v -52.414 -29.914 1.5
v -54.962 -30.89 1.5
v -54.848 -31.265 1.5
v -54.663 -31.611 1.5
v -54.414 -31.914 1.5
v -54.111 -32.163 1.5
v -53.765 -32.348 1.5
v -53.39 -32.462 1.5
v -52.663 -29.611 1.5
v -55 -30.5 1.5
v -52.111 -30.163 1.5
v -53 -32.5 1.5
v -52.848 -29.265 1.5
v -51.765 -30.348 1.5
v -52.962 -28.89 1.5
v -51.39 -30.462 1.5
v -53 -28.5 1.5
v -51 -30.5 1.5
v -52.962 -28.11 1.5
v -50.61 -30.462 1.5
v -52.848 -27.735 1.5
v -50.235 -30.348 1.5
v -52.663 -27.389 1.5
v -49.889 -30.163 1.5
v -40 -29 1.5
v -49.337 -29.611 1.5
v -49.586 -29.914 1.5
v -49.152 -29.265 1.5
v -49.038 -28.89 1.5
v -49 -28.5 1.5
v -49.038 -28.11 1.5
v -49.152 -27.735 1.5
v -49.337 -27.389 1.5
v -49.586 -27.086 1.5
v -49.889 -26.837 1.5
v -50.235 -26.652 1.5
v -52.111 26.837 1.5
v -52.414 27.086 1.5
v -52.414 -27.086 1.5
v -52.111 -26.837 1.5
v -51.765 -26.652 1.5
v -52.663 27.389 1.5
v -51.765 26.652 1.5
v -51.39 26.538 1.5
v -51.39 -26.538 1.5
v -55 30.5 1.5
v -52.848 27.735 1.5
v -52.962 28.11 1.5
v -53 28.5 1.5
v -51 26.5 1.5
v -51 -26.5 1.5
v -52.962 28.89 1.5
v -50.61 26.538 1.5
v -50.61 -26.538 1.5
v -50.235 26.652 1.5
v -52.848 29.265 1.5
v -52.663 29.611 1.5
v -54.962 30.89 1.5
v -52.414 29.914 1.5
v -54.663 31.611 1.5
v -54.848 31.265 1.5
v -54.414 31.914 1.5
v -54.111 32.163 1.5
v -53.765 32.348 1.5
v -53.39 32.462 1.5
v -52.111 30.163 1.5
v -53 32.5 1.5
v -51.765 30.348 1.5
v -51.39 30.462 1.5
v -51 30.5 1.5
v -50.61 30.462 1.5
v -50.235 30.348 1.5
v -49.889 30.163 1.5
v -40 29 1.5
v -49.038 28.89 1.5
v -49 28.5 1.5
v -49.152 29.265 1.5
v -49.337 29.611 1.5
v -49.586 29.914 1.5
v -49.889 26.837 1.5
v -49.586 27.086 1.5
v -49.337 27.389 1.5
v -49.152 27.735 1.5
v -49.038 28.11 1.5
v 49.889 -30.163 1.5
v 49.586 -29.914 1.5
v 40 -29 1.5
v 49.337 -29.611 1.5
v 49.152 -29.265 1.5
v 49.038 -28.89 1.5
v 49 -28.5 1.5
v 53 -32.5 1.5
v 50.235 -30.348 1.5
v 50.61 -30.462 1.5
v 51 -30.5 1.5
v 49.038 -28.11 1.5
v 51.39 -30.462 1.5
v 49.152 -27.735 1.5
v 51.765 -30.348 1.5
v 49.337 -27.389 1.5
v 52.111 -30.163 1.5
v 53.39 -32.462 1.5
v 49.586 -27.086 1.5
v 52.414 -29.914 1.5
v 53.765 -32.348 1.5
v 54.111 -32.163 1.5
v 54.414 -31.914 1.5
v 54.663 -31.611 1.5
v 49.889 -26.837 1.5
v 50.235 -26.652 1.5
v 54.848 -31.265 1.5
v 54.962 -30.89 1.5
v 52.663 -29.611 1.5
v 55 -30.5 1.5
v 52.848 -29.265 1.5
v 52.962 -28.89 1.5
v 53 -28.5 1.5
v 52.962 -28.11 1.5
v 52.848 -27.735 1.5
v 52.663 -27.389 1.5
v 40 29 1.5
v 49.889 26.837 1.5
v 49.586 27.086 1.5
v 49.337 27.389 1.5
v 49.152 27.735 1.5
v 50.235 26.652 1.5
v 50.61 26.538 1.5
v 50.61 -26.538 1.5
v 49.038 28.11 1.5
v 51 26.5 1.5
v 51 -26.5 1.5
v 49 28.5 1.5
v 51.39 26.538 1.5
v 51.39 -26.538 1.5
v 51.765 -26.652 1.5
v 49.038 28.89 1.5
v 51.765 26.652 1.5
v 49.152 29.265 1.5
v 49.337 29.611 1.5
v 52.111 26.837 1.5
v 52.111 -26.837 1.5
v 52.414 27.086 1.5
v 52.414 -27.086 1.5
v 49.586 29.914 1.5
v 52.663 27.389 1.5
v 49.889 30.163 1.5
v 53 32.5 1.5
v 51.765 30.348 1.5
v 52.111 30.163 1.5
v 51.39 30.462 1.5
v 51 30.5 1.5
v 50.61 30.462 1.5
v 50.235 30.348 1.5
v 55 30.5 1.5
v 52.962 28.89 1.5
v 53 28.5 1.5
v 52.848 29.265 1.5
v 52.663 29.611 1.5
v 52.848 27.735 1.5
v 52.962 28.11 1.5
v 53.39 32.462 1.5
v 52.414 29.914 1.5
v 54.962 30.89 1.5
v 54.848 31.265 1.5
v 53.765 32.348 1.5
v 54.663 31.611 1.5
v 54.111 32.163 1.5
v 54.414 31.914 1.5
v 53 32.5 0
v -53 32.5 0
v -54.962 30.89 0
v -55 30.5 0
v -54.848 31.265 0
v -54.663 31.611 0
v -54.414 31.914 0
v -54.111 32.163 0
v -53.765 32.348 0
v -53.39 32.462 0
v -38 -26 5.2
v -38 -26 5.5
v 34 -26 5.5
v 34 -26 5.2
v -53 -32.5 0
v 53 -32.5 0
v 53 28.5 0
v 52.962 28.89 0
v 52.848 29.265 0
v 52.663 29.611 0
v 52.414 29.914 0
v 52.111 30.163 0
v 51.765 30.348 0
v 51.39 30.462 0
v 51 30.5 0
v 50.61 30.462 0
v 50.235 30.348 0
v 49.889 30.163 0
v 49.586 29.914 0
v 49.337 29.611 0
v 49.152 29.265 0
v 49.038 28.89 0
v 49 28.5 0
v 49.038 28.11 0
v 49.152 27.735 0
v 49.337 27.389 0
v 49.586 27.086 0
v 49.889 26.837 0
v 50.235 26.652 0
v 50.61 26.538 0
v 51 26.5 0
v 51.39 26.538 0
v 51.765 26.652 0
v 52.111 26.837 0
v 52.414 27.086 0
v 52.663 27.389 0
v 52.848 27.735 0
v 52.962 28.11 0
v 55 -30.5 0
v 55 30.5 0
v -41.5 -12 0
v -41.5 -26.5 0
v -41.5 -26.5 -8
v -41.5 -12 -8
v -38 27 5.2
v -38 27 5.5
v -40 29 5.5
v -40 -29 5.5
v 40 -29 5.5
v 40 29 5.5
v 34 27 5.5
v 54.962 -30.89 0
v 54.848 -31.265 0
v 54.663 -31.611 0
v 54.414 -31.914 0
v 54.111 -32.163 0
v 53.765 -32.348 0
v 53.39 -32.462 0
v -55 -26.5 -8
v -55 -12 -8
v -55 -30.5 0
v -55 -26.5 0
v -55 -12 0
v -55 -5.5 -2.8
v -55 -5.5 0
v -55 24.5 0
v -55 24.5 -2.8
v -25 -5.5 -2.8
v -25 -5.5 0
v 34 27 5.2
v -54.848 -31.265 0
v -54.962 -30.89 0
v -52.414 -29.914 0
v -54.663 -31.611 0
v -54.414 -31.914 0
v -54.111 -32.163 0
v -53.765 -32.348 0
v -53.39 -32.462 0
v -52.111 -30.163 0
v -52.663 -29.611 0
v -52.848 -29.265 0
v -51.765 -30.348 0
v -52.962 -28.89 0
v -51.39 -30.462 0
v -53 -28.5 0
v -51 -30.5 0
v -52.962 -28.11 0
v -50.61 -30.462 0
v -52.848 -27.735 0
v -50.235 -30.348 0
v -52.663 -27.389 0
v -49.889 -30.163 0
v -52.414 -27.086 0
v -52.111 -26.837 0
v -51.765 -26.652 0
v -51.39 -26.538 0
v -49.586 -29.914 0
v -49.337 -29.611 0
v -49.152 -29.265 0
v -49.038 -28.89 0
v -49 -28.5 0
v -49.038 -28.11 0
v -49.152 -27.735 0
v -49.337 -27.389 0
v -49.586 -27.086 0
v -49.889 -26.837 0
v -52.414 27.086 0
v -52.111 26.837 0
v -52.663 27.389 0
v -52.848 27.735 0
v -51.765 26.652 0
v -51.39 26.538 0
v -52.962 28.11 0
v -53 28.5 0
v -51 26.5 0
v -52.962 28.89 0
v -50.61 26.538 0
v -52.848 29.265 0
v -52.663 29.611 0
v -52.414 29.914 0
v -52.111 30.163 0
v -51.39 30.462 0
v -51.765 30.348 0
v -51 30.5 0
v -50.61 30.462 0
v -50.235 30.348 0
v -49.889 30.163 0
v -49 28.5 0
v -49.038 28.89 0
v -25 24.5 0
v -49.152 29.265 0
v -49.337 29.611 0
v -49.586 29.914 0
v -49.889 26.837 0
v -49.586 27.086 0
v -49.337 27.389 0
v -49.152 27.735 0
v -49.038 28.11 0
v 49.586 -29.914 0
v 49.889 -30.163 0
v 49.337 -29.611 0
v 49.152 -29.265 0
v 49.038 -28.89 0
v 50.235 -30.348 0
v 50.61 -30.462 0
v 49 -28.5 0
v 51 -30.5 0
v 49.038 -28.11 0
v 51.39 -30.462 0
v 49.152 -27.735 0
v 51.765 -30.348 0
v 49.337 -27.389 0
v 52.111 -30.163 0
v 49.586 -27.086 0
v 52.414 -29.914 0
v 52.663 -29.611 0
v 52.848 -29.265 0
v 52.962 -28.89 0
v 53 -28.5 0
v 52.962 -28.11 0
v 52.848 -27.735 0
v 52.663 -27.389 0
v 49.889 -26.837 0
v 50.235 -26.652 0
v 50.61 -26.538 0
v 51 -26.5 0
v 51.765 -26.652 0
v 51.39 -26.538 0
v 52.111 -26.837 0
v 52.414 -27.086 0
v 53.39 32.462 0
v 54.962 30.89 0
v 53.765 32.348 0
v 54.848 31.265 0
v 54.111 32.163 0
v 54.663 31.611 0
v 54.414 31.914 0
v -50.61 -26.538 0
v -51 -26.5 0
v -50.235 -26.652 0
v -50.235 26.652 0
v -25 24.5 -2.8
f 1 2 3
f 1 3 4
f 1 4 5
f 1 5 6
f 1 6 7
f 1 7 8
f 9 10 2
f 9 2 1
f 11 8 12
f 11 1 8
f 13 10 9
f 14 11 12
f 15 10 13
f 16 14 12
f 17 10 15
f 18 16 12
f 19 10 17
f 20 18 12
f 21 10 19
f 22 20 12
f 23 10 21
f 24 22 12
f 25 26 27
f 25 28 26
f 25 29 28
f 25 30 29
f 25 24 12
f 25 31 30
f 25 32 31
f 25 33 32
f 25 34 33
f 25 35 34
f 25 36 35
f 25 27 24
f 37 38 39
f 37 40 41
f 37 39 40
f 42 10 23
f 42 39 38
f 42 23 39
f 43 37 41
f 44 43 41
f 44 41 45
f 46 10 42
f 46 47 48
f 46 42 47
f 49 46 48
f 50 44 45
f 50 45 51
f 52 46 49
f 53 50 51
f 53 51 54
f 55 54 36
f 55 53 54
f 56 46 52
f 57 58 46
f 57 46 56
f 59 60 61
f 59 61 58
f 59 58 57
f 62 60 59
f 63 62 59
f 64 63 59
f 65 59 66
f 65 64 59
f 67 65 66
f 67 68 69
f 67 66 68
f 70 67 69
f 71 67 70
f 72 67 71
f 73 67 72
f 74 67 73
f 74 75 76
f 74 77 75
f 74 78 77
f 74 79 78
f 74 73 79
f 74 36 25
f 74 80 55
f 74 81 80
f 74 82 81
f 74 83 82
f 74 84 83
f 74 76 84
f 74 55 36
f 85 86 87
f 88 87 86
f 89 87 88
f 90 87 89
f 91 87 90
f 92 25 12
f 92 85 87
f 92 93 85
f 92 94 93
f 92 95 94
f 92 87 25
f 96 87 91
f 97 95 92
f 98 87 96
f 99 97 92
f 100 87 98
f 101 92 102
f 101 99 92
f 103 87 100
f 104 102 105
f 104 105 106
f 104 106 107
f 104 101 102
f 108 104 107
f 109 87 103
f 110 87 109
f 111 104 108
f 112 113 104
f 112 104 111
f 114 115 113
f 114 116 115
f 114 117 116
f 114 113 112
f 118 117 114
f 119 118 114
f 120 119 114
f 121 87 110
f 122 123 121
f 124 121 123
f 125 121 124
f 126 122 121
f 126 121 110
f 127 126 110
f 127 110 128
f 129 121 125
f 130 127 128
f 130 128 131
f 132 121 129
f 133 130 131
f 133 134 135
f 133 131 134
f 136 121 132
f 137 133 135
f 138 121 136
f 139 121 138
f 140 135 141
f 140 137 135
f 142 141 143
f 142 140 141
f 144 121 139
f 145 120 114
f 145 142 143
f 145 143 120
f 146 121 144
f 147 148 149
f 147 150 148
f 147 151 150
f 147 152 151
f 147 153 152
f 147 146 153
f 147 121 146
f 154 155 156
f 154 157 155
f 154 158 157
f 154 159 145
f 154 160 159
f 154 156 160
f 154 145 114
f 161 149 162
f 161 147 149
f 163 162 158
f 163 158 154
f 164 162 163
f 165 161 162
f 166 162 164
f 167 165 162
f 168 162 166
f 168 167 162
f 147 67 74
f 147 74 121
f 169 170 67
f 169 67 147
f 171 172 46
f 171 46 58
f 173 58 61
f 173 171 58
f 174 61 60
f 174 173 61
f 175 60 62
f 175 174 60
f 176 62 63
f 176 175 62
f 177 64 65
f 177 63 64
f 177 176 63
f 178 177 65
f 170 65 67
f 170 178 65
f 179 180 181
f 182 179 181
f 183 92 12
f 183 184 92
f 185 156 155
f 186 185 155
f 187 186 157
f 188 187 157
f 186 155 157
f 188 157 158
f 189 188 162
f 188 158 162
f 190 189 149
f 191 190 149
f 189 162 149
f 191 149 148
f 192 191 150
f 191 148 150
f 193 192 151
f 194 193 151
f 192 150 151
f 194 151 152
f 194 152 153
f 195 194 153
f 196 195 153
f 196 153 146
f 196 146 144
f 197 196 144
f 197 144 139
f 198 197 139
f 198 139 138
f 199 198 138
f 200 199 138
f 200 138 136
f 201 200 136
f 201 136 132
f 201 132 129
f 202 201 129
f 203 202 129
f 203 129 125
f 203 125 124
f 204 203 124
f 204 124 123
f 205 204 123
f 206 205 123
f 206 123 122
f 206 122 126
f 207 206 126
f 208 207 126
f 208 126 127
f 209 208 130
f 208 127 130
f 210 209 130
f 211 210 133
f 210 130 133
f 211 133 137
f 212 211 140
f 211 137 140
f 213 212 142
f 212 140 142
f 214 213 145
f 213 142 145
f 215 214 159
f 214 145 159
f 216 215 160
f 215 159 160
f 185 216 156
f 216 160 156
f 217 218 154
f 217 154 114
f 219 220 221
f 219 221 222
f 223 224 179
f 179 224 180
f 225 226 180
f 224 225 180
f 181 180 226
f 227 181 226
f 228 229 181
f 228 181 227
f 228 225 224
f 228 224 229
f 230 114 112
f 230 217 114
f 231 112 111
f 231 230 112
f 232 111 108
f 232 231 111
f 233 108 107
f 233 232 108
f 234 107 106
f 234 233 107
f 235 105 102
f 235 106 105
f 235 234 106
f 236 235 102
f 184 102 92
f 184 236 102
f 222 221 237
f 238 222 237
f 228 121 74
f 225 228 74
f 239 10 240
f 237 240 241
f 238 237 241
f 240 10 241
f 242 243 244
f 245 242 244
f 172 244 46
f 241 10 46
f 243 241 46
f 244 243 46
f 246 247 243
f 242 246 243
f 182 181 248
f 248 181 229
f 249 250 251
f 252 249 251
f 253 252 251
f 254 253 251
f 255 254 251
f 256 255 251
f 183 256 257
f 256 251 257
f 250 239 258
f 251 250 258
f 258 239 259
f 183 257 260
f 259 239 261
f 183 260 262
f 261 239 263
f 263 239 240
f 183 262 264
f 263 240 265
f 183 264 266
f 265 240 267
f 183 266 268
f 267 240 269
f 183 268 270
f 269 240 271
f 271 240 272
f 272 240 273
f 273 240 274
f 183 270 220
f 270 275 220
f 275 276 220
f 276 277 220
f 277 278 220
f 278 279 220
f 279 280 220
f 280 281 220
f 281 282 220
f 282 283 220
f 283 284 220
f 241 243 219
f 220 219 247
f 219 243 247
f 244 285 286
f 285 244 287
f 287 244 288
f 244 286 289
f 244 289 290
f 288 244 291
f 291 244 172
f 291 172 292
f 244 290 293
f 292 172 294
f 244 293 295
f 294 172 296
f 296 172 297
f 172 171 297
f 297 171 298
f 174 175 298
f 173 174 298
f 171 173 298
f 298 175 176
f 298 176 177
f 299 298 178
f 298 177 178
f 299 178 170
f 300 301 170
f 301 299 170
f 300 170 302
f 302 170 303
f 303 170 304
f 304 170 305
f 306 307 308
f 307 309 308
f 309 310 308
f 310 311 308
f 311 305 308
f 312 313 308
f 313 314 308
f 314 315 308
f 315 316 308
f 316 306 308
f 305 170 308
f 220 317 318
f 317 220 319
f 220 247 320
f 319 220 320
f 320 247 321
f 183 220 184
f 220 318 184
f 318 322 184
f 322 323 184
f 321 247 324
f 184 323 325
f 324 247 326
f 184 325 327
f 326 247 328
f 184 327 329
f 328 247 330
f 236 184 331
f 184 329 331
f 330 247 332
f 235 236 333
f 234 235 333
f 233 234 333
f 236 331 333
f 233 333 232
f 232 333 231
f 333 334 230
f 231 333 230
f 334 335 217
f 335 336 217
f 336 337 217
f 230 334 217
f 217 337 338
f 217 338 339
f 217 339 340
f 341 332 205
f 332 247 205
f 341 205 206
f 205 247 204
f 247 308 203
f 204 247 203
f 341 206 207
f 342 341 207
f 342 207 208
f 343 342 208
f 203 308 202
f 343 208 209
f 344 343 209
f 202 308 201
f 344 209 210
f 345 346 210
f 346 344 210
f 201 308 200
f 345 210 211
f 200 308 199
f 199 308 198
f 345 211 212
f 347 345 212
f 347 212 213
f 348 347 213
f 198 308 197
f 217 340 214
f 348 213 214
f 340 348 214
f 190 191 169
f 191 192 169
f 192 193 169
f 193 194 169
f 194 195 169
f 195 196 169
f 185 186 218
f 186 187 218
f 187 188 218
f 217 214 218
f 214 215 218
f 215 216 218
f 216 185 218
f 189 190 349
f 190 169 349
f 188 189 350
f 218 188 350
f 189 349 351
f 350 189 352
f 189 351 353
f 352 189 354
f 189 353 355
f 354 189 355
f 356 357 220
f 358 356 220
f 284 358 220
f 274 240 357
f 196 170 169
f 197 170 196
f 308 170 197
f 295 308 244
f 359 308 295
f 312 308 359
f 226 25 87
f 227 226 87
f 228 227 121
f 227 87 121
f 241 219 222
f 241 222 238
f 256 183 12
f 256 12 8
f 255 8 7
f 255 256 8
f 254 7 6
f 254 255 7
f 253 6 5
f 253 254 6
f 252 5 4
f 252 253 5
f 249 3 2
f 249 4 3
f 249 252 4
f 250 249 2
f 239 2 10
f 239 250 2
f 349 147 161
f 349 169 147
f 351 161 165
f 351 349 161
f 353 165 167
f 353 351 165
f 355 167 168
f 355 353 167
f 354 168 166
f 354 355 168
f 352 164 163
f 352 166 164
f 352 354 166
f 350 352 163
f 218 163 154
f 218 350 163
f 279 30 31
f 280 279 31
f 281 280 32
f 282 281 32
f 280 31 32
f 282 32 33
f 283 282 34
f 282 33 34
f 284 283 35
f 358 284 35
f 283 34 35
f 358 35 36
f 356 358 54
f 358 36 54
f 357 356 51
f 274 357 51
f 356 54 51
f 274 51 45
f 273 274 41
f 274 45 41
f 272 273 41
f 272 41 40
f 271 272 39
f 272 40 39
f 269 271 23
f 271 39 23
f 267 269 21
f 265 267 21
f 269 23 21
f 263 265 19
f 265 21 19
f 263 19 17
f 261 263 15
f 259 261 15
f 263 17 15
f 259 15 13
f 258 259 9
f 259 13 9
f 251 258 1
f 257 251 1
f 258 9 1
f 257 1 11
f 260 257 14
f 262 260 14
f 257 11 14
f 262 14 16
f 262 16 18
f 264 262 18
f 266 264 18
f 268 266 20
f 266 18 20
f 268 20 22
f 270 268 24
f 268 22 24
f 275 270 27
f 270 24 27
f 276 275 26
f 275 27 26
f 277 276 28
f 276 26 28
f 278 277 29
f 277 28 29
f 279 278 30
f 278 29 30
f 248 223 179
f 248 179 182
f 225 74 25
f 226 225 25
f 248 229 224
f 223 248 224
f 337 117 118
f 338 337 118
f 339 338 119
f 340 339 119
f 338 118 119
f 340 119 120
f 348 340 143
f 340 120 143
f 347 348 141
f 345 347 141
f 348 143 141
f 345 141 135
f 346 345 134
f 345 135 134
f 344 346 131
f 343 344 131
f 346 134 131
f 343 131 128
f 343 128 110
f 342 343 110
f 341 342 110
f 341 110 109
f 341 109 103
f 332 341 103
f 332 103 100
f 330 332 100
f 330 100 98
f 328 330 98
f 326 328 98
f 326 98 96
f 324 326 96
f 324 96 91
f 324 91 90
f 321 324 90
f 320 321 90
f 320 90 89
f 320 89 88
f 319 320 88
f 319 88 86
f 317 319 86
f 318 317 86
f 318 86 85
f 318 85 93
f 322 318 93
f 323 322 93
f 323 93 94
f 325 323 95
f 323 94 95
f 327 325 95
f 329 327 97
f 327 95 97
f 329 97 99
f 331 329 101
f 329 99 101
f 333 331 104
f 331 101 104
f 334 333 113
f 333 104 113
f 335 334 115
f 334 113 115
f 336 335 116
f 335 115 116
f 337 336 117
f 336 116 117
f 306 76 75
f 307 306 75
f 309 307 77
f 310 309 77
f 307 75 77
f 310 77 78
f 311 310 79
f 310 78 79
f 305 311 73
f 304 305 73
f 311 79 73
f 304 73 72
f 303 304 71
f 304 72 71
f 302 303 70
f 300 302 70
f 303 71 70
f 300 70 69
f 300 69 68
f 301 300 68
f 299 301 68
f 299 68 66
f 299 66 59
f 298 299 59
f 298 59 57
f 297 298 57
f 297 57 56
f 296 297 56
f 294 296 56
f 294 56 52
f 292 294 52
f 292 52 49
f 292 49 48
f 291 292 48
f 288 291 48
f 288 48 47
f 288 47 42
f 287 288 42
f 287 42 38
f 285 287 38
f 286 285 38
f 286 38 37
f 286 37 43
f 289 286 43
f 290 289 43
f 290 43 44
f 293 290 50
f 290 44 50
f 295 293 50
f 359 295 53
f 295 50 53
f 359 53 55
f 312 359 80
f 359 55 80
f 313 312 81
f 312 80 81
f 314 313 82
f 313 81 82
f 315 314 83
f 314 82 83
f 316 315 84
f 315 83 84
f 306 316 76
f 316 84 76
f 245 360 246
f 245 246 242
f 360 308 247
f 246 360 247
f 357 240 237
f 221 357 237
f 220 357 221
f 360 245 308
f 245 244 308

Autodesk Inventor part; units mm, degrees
ref_plane "YZ Plane" through (0, 0, 0) normal (1, 0, 0) x (0, 1, 0)
ref_plane "XZ Plane" through (0, 0, 0) normal (0, 1, 0) x (-1, 0, 0)
ref_plane "XY Plane" through (0, 0, 0) normal (0, 0, 1) x (1, 0, 0)
sketch "Skizze1" plane through (0, 0, 0) normal (0, 0, 1) x (1, 0, 0)
  line L0 (-53, 32.5) -> (53, 32.5)
  line L1 (55, 30.5) -> (55, -30.5)
  line L2 (53, -32.5) -> (-53, -32.5)
  line L3 (-55, -30.5) -> (-55, 30.5)
  line L4 (-55, 32.5) -> (55, -32.5) construction
  line L5 (55, 32.5) -> (-55, -32.5) construction
  arc A0 (-53, 32.5) -> (-55, 30.5) centre (-53, 30.5) ccw
  arc A1 (55, 30.5) -> (53, 32.5) centre (53, 30.5) ccw
  arc A2 (53, -32.5) -> (55, -30.5) centre (53, -30.5) ccw
  arc A3 (-55, -30.5) -> (-53, -32.5) centre (-53, -30.5) ccw
  point P0 (0, 0)
  dimension "d0" = 110
  dimension "d1" = 65
  dimension "d2" = 2
extrude "Extrusion1" add sketch "Skizze1" along normal blind 1.5
sketch "Skizze2" plane through (0, 0, 1.5) normal (0, 0, 1) x (1, 0, 0)
  circle A0 centre (-51, 28.5) radius 2
  circle A1 centre (-51, -28.5) radius 2
  circle A2 centre (51, -28.5) radius 2
  circle A3 centre (51, 28.5) radius 2
  line L0 (-55, 30.5) -> (-55, -30.5) projected
  line L1 (-53, -32.5) -> (53, -32.5) projected
  point P0 (0, 0)
  dimension "d5" = 4
  dimension "d6" = 4
  dimension "d7" = 4
  dimension "d8" = 4
  dimension "d9" = 102
  dimension "d10" = 102
  dimension "d11" = 57
  dimension "d12" = 57
  dimension "d13" = 4
  dimension "d14" = 4
  dimension "d15" = 4
  dimension "d16" = 4
extrude "Extrusion2" cut sketch "Skizze2" against normal up to next
sketch "Skizze3" plane through (0, 0, 1.5) normal (0, 0, 1) x (1, 0, 0)
  line L0 (-40, -29) -> (40, -29)
  line L1 (40, -29) -> (40, 29)
  line L2 (40, 29) -> (-40, 29)
  line L3 (-40, 29) -> (-40, -29)
  line L4 (53, 32.5) -> (-53, 32.5) projected
  line L5 (-55, 30.5) -> (-55, -30.5) projected
  point P0 (0, 0)
  dimension "d19" = 80
  dimension "d20" = 58
  dimension "d21" = 3.5
  dimension "d22" = 15
extrude "Extrusion3" add sketch "Skizze3" along normal blind 4
sketch "Skizze4" plane through (0, 0, 5.5) normal (0, 0, 1) x (1, 0, 0)
  line L0 (-38, -26) -> (34, -26)
  line L1 (34, -26) -> (34, 27)
  line L2 (34, 27) -> (-38, 27)
  line L3 (-38, 27) -> (-38, -26)
  line L4 (-40, 29) -> (-40, -29) projected
  line L5 (40, 29) -> (-40, 29) projected
  point P0 (0, 0)
  dimension "d25" = 72
  dimension "d26" = 53
  dimension "d27" = 2
  dimension "d28" = 2
extrude "Extrusion4" cut sketch "Skizze4" against normal blind 0.3
sketch "Skizze5" plane through (0, 0, 0) normal (0, 0, -1) x (-1, 0, 0)
  line L0 (55, -30.5) -> (55, 30.5) projected
  line L1 (55, -26.5) -> (41.5, -26.5)
  line L2 (41.5, -26.5) -> (41.5, -12)
  line L3 (41.5, -12) -> (55, -12)
  line L4 (55, -12) -> (55, -26.5)
  line L5 (-53, -32.5) -> (53, -32.5) projected
  point P0 (0, 0)
  dimension "d31" = 14.5
  dimension "d32" = 6
  dimension "d33" = 13.5
extrude "Extrusion5" add sketch "Skizze5" along normal blind 8
sketch "Skizze6" plane through (0, 0, 0) normal (0, 0, -1) x (-1, 0, 0)
  line L0 (55, 30.5) -> (55, -30.5) projected
  line L1 (55, 24.5) -> (25, 24.5)
  line L2 (25, 24.5) -> (25, -5.5)
  line L3 (25, -5.5) -> (55, -5.5)
  line L4 (55, -5.5) -> (55, 24.5)
  line L5 (53, 32.5) -> (-53, 32.5) projected
  point P0 (0, 0)
  dimension "d36" = 30
  dimension "d37" = 30
  dimension "d38" = 8
extrude "Extrusion6" add sketch "Skizze6" along normal blind 2.8
properties part number "MKF TFT32" material "Edelstahl, 440C"
